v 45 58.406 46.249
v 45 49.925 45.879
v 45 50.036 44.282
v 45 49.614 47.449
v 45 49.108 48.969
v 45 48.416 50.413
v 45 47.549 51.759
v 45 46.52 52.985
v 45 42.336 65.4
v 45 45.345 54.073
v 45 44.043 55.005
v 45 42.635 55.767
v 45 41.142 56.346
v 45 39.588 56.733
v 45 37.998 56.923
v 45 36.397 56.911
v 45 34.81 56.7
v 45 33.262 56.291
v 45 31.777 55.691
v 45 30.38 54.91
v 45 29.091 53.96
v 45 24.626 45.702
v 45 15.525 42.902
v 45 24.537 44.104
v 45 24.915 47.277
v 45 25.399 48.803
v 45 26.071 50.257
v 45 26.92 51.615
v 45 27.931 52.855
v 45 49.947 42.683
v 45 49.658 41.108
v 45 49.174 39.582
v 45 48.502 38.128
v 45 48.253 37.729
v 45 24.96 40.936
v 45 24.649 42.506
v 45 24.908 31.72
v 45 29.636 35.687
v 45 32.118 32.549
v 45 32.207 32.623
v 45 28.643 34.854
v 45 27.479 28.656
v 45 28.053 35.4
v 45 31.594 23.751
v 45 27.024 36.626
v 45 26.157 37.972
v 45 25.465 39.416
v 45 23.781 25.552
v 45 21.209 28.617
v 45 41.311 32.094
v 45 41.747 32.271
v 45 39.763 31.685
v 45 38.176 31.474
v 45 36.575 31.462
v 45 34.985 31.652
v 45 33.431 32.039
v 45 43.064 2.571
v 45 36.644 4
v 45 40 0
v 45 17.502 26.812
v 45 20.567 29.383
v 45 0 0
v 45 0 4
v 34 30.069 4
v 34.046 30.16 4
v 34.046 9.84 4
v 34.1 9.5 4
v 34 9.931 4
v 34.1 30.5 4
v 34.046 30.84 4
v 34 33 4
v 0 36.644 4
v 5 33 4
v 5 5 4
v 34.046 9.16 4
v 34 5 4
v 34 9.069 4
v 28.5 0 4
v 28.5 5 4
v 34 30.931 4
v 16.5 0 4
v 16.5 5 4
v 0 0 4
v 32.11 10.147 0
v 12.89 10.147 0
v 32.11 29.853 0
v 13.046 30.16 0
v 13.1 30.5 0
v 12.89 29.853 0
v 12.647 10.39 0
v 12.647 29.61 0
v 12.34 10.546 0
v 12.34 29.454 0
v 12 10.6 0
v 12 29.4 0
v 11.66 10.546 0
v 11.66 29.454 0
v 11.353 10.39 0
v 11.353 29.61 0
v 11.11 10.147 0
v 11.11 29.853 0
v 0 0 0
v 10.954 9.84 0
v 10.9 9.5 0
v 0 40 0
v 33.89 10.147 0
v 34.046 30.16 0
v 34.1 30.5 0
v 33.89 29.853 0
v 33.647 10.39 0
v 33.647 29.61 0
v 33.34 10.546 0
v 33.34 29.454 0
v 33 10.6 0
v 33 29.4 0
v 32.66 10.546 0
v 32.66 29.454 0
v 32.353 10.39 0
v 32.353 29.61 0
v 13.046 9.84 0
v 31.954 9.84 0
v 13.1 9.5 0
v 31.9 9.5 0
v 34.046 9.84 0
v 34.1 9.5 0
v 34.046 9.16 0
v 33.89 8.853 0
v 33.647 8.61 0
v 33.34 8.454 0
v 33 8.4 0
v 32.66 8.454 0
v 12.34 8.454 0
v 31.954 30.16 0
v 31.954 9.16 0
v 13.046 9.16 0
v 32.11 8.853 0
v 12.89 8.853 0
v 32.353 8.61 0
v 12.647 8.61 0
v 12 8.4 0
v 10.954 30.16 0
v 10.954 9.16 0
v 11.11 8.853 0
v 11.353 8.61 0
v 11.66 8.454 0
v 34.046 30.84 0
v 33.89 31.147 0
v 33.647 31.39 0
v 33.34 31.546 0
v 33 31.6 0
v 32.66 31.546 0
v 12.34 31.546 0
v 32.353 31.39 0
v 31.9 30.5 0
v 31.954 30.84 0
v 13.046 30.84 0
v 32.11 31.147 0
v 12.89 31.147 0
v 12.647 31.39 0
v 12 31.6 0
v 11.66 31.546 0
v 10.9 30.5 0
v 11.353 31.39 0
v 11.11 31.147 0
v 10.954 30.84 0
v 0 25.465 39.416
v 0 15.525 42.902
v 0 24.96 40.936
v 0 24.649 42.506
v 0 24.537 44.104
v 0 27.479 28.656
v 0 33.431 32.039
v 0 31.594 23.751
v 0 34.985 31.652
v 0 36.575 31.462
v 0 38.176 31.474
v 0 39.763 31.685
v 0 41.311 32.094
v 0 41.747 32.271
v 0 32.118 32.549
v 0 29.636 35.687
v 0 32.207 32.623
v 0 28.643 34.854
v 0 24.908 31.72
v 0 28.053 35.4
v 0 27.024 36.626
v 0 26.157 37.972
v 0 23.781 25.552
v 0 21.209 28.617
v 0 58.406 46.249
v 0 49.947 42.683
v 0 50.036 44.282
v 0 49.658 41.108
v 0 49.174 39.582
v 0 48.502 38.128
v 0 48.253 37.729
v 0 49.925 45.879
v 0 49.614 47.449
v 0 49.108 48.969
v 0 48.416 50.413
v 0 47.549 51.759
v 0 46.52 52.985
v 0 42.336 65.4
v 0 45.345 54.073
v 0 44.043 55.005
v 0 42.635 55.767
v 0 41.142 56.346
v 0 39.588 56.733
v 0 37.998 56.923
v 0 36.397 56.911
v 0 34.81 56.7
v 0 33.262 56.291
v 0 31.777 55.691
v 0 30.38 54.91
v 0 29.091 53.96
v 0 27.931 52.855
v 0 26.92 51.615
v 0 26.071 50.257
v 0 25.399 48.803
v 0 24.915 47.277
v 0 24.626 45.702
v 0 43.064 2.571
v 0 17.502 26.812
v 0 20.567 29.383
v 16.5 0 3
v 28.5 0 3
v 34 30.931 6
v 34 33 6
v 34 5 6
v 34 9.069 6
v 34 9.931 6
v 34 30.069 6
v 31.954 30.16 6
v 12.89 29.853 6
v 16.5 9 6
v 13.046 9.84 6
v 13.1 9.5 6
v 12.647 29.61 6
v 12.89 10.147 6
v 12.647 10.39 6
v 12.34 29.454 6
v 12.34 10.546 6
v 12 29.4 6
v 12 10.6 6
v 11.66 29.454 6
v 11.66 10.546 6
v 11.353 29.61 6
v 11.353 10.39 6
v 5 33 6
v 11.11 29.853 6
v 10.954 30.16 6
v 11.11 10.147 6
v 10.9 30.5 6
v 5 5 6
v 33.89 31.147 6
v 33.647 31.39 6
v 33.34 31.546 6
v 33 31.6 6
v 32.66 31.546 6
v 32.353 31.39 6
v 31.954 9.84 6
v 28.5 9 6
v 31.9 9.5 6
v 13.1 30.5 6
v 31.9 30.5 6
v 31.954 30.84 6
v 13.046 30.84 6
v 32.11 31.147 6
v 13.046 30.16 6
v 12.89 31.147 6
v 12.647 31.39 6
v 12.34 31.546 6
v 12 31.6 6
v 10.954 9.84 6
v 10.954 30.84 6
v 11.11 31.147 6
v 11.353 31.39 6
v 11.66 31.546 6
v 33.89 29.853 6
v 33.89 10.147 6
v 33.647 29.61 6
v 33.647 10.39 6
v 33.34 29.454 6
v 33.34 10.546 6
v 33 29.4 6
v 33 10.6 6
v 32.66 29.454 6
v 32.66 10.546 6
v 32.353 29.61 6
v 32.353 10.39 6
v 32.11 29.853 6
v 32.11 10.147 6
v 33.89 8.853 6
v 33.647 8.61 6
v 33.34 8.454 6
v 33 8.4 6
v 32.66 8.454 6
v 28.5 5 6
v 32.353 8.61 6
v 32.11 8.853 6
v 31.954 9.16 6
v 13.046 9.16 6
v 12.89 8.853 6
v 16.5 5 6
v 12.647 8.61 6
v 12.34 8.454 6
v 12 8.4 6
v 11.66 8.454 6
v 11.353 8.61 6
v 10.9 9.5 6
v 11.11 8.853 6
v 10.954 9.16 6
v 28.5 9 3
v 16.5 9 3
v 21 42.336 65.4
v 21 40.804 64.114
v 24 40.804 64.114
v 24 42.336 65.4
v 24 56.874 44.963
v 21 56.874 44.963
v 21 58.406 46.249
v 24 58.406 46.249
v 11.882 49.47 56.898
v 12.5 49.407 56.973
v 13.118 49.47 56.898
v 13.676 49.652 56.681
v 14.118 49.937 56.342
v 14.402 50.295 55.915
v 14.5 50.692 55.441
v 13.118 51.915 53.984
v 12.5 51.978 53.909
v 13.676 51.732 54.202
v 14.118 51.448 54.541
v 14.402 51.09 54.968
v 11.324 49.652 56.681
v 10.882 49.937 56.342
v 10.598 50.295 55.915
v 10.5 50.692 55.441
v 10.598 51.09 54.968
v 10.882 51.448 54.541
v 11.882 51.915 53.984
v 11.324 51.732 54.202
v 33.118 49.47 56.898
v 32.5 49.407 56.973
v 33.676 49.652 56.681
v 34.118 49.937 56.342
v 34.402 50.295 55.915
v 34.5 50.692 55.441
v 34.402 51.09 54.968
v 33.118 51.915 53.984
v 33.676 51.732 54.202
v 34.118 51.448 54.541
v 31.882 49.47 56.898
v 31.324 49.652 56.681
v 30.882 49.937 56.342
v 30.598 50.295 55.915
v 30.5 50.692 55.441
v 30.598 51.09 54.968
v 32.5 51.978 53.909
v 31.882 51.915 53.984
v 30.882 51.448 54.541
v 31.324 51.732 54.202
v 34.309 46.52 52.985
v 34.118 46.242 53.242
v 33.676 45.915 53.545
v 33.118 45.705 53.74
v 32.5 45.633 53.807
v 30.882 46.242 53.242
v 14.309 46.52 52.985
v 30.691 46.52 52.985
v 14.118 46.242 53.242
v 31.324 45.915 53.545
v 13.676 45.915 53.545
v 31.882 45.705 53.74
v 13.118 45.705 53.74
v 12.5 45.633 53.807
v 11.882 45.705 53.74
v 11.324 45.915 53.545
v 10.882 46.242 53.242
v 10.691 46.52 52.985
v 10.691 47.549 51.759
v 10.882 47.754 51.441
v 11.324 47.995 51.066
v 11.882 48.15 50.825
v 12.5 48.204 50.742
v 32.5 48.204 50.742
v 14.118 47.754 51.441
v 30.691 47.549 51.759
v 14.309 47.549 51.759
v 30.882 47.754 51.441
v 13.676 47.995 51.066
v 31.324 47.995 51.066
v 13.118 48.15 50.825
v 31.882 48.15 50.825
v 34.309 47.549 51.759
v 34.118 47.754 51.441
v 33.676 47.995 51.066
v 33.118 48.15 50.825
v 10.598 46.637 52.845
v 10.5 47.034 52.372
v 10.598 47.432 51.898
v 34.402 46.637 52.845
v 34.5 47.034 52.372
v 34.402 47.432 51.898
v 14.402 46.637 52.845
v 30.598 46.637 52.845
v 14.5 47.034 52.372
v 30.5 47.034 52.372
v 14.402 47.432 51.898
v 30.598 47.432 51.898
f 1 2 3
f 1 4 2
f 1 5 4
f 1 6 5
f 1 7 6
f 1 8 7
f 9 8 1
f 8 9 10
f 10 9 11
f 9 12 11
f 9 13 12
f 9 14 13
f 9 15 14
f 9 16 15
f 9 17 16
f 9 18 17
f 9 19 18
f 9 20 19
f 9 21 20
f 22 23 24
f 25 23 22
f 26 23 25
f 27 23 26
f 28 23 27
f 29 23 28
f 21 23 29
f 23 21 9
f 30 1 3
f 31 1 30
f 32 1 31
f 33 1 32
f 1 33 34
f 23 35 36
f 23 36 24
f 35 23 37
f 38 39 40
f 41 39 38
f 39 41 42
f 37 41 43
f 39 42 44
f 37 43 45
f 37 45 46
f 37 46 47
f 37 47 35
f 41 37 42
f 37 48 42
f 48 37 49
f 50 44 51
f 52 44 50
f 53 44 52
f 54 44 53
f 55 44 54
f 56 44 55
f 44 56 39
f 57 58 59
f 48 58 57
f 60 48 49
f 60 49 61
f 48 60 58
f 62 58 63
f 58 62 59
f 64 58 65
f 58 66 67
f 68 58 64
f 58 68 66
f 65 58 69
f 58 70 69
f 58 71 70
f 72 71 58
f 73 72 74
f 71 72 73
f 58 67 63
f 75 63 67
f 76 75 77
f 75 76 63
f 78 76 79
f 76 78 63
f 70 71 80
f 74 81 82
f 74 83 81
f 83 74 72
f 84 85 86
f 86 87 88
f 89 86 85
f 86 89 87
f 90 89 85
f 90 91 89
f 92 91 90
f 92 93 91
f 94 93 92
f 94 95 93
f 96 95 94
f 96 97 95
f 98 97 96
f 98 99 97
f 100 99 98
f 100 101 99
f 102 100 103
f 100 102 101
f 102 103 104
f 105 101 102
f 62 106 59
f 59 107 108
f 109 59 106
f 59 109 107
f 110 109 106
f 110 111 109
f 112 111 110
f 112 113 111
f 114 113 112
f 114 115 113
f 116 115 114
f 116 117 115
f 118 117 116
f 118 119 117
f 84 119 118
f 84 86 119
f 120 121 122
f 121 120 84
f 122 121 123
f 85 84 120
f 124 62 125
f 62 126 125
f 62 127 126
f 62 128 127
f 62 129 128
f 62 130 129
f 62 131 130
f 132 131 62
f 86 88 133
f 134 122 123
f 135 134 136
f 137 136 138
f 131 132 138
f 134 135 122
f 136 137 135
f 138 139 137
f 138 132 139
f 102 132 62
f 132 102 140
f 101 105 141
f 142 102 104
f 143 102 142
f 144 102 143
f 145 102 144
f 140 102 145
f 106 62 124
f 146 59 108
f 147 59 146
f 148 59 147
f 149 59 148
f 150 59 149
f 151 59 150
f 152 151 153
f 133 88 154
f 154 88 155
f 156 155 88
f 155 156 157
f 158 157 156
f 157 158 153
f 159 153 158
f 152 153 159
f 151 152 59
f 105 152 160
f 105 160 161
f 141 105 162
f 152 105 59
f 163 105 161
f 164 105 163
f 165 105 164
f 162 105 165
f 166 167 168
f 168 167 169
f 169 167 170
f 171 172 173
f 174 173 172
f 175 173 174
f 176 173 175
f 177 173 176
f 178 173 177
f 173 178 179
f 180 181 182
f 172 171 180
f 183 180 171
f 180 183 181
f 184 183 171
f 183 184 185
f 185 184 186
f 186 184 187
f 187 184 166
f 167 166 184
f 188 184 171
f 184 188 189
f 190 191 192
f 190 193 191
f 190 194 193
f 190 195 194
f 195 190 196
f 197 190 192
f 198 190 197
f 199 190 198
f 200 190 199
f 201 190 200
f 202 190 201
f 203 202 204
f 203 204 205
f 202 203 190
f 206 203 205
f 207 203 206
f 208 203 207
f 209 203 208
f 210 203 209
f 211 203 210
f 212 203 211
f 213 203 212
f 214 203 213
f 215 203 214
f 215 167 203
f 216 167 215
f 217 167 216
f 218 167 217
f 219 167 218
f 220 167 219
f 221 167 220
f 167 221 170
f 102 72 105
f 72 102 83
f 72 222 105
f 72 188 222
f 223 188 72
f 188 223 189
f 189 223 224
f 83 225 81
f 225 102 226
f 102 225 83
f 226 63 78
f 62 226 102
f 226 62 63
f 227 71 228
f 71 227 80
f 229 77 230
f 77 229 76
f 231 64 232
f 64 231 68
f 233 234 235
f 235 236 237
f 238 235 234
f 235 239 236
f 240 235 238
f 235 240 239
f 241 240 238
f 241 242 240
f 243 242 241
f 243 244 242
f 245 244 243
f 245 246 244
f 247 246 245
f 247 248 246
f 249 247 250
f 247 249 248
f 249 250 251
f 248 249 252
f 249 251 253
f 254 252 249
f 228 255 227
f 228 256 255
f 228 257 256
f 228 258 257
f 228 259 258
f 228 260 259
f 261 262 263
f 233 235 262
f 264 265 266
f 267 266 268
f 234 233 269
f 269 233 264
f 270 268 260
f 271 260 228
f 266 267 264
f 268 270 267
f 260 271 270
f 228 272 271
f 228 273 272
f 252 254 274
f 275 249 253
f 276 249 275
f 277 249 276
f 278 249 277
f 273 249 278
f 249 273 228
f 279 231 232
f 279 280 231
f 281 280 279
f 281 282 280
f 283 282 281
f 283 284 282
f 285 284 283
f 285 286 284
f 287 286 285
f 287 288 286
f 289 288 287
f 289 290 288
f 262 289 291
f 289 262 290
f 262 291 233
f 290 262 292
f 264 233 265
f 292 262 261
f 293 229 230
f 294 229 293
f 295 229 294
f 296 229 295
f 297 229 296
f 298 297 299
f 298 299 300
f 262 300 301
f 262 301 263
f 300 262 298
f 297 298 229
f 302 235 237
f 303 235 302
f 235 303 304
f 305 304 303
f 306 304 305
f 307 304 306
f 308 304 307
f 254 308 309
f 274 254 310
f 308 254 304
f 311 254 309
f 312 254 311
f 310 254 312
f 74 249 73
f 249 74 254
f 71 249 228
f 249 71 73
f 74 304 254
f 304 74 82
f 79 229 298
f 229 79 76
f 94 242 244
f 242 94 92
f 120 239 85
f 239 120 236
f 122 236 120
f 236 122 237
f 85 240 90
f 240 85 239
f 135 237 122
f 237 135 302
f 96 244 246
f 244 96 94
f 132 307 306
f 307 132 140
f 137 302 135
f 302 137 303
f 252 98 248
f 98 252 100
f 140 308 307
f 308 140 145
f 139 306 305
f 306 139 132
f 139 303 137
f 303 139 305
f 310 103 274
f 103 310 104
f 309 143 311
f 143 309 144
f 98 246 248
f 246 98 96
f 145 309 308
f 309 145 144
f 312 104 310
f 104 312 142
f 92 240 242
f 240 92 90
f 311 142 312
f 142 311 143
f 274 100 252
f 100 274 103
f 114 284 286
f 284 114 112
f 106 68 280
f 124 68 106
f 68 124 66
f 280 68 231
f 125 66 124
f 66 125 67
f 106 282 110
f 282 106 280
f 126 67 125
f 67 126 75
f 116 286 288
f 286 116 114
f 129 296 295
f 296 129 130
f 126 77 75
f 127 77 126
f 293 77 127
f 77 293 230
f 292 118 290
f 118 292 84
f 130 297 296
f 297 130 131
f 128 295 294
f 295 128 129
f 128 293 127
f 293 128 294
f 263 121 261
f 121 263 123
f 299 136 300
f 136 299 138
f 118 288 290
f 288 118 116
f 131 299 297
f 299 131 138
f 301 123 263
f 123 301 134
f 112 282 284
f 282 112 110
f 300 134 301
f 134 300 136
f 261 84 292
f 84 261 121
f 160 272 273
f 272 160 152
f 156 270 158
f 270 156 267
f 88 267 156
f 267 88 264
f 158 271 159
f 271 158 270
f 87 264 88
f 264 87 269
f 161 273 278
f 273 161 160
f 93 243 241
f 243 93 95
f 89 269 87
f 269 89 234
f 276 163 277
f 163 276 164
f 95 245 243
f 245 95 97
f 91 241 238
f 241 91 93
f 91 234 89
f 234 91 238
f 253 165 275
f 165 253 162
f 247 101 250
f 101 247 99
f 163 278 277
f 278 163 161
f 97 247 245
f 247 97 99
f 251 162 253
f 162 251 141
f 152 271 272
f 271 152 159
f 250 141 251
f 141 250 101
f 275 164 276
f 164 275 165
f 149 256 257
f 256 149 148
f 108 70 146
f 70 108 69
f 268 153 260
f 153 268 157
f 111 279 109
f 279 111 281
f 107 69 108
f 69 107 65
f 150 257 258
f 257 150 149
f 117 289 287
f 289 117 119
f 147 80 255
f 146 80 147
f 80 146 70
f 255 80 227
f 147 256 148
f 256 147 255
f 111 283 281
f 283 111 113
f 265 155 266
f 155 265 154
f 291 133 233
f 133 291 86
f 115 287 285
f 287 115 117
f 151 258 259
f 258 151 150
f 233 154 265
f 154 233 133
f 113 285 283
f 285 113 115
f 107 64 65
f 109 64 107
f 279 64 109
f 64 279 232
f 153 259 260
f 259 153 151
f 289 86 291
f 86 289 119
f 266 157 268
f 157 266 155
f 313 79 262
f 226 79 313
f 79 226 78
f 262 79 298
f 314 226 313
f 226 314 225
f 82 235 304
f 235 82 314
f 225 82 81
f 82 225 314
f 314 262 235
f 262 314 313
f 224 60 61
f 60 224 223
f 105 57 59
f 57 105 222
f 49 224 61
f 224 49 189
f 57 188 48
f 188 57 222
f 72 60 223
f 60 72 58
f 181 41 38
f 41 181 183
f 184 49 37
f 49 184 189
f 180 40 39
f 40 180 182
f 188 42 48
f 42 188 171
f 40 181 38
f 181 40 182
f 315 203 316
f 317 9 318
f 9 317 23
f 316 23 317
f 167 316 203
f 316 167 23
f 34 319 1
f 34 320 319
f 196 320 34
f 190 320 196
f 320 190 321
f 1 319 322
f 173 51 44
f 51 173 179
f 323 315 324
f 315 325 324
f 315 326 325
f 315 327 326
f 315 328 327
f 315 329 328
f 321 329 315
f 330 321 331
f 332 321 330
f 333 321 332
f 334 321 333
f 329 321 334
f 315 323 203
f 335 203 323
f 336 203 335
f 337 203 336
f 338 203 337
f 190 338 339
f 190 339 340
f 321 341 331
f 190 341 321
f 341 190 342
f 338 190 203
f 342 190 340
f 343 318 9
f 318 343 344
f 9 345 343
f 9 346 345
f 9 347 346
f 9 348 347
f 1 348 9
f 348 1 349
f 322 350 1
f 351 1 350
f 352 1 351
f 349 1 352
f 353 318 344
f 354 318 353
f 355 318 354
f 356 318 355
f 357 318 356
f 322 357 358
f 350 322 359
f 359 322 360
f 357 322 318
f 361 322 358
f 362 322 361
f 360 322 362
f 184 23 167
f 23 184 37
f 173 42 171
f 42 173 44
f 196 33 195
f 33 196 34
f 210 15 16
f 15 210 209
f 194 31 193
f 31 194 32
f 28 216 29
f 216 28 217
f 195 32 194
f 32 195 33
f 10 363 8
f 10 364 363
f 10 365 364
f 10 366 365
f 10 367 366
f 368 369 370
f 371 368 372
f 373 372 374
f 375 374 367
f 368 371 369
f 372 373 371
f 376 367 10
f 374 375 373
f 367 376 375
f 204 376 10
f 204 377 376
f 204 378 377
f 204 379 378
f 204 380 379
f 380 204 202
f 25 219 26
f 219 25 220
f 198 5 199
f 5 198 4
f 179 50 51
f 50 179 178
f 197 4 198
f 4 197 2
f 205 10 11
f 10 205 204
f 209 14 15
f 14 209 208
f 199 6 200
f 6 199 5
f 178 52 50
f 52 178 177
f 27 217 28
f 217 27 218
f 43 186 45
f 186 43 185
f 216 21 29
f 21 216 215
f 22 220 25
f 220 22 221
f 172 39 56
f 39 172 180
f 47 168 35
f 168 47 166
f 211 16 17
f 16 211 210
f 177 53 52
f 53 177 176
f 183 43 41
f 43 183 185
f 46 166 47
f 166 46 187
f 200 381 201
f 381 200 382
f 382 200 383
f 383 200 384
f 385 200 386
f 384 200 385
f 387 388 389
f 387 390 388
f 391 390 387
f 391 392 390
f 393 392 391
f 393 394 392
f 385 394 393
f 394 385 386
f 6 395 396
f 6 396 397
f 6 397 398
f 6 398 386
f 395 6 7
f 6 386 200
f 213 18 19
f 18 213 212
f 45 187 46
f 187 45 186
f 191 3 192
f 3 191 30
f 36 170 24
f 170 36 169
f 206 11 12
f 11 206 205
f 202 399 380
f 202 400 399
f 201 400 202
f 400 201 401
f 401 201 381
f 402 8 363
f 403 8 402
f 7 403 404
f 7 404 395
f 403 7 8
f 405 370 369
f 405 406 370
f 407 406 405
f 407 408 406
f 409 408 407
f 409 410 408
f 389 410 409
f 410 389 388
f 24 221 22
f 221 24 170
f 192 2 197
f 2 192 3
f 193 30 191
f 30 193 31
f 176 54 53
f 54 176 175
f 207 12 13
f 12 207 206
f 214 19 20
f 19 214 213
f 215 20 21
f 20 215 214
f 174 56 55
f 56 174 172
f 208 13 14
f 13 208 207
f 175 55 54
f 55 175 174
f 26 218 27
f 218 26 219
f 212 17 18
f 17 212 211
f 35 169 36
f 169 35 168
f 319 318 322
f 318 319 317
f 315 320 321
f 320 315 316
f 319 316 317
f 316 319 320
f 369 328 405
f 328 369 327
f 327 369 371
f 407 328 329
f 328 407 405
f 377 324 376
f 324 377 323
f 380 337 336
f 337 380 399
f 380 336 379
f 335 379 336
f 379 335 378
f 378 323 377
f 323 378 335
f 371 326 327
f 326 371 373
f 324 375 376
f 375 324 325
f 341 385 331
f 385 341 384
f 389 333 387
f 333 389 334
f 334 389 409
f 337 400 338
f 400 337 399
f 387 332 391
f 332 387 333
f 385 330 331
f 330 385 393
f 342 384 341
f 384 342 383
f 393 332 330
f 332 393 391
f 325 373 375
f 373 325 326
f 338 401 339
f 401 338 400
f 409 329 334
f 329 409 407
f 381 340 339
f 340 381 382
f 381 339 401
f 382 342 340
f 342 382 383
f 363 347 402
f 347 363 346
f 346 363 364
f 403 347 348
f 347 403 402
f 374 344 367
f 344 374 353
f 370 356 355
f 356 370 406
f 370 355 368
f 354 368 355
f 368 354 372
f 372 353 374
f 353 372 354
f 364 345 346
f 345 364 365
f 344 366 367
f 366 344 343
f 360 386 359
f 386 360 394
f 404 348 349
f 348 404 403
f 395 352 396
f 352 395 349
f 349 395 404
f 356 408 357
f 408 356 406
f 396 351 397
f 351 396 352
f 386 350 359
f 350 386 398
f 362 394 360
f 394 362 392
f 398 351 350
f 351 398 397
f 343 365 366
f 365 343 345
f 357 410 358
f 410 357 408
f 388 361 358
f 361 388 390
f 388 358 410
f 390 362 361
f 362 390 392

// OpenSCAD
// Arducam IMX219 Camera Mount for Cotton Picking Robot
// Designed for NVIDIA Jetson Nano
// Print Settings: 0.2mm layer, 20% infill, PLA or PETG

// ============== CUSTOMIZABLE PARAMETERS ==============

// Camera specifications
camera_pcb_width = 25;      // Arducam PCB width (mm)
camera_pcb_height = 24;     // Arducam PCB height (mm)
camera_pcb_thickness = 1.6; // PCB thickness (mm)
camera_hole_spacing = 21;   // Distance between mounting holes (mm)
camera_hole_diameter = 2.2; // M2 screw holes (mm)

// Mount plate dimensions
plate_width = 45;           // Base plate width (mm)
plate_length = 40;          // Base plate length (mm)
plate_thickness = 4;        // Base plate thickness (mm)

// Viewing angle
camera_tilt_angle = 40;     // Downward tilt angle (degrees)

// Jetson Nano mounting
jetson_hole_spacing = 58;   // Jetson Nano mounting hole spacing (mm)
jetson_hole_diameter = 3.2; // M3 screw holes (mm)

// Robot arm attachment
use_robot_clamp = true;     // Set to false for Jetson direct mount
clamp_diameter = 25;        // Robot arm tube diameter (mm)

// ============== MODULES ==============

module camera_holder() {
    difference() {
        // Main holder body
        union() {
            // Base plate
            cube([plate_width, plate_length, plate_thickness]);
            
            // Raised camera platform
            translate([5, 5, plate_thickness])
                cube([camera_pcb_width + 4, camera_pcb_height + 4, 2]);
        }
        
        // Camera mounting screw holes (M2)
        hole_offset_x = (plate_width - camera_hole_spacing) / 2;
        hole_offset_y = (plate_length - camera_hole_spacing) / 2;
        
        translate([hole_offset_x, hole_offset_y, -1])
            cylinder(h=plate_thickness+4, d=camera_hole_diameter, $fn=20);
        translate([hole_offset_x + camera_hole_spacing, hole_offset_y, -1])
            cylinder(h=plate_thickness+4, d=camera_hole_diameter, $fn=20);
        translate([hole_offset_x, hole_offset_y + camera_hole_spacing, -1])
            cylinder(h=plate_thickness+4, d=camera_hole_diameter, $fn=20);
        translate([hole_offset_x + camera_hole_spacing, hole_offset_y + camera_hole_spacing, -1])
            cylinder(h=plate_thickness+4, d=camera_hole_diameter, $fn=20);
        
        // Cable access slot
        translate([plate_width/2 - 6, -1, plate_thickness - 1])
            cube([12, 10, 3]);
    }
}

module angle_bracket() {
    rotate([camera_tilt_angle, 0, 0]) {
        // Vertical support
        cube([plate_width, plate_thickness, 35]);
        
        // Horizontal support
        translate([0, 0, 30])
            cube([plate_width, 15, plate_thickness]);
    }
}

module robot_clamp() {
    difference() {
        // Clamp body
        translate([0, -clamp_diameter/2 - 5, 0])
            cube([plate_width, clamp_diameter + 10, 25]);
        
        // Tube hole
        translate([plate_width/2, 0, 12])
            rotate([0, 90, 0])
                cylinder(h=plate_width+2, d=clamp_diameter + 0.5, center=true, $fn=50);
        
        // Tightening slot
        translate([plate_width/2 - 1.5, clamp_diameter/2 + 3, -1])
            cube([3, 8, 27]);
        
        // Bolt holes for clamping
        translate([plate_width/2 - 10, clamp_diameter/2 + 6, 12])
            rotate([90, 0, 0])
                cylinder(h=15, d=4, $fn=20);
        translate([plate_width/2 + 10, clamp_diameter/2 + 6, 12])
            rotate([90, 0, 0])
                cylinder(h=15, d=4, $fn=20);
    }
}

module jetson_mount_bracket() {
    difference() {
        // Base plate
        cube([70, 70, plate_thickness]);
        
        // Jetson Nano mounting holes (58mm spacing)
        hole_offset = (70 - jetson_hole_spacing) / 2;
        
        translate([hole_offset, hole_offset, -1])
            cylinder(h=plate_thickness+2, d=jetson_hole_diameter, $fn=20);
        translate([hole_offset + jetson_hole_spacing, hole_offset, -1])
            cylinder(h=plate_thickness+2, d=jetson_hole_diameter, $fn=20);
        translate([hole_offset, hole_offset + jetson_hole_spacing, -1])
            cylinder(h=plate_thickness+2, d=jetson_hole_diameter, $fn=20);
        translate([hole_offset + jetson_hole_spacing, hole_offset + jetson_hole_spacing, -1])
            cylinder(h=plate_thickness+2, d=jetson_hole_diameter, $fn=20);
    }
}

// ============== ASSEMBLY ==============

// Camera holder with angle
camera_holder();
translate([0, plate_length, 0])
    angle_bracket();

// Choose mounting method
if (use_robot_clamp) {
    // Robot arm clamp mount
    translate([0, 45, 35])
        rotate([camera_tilt_angle, 0, 0])
            robot_clamp();
} else {
    // Jetson Nano direct mount
    translate([-12.5, 45, 35])
        rotate([camera_tilt_angle, 0, 0])
            jetson_mount_bracket();
}

// ============== PRINT INSTRUCTIONS ==============
// 1. Export this as STL: File > Export > Export as STL
// 2. Print settings:
//    - Layer height: 0.2mm
//    - Infill: 20-25%
//    - Material: PLA (indoor) or PETG (outdoor)
//    - Supports: YES (for angle bracket overhang)
//    - Adhesion: Brim recommended
// 3. Hardware needed:
//    - M2 x 8mm screws (x4) for camera
//    - M3 x 10mm screws (x4) for Jetson/robot mount
//    - M4 x 20mm bolts (x2) for robot clamp (if used)
//    - Nuts as needed
